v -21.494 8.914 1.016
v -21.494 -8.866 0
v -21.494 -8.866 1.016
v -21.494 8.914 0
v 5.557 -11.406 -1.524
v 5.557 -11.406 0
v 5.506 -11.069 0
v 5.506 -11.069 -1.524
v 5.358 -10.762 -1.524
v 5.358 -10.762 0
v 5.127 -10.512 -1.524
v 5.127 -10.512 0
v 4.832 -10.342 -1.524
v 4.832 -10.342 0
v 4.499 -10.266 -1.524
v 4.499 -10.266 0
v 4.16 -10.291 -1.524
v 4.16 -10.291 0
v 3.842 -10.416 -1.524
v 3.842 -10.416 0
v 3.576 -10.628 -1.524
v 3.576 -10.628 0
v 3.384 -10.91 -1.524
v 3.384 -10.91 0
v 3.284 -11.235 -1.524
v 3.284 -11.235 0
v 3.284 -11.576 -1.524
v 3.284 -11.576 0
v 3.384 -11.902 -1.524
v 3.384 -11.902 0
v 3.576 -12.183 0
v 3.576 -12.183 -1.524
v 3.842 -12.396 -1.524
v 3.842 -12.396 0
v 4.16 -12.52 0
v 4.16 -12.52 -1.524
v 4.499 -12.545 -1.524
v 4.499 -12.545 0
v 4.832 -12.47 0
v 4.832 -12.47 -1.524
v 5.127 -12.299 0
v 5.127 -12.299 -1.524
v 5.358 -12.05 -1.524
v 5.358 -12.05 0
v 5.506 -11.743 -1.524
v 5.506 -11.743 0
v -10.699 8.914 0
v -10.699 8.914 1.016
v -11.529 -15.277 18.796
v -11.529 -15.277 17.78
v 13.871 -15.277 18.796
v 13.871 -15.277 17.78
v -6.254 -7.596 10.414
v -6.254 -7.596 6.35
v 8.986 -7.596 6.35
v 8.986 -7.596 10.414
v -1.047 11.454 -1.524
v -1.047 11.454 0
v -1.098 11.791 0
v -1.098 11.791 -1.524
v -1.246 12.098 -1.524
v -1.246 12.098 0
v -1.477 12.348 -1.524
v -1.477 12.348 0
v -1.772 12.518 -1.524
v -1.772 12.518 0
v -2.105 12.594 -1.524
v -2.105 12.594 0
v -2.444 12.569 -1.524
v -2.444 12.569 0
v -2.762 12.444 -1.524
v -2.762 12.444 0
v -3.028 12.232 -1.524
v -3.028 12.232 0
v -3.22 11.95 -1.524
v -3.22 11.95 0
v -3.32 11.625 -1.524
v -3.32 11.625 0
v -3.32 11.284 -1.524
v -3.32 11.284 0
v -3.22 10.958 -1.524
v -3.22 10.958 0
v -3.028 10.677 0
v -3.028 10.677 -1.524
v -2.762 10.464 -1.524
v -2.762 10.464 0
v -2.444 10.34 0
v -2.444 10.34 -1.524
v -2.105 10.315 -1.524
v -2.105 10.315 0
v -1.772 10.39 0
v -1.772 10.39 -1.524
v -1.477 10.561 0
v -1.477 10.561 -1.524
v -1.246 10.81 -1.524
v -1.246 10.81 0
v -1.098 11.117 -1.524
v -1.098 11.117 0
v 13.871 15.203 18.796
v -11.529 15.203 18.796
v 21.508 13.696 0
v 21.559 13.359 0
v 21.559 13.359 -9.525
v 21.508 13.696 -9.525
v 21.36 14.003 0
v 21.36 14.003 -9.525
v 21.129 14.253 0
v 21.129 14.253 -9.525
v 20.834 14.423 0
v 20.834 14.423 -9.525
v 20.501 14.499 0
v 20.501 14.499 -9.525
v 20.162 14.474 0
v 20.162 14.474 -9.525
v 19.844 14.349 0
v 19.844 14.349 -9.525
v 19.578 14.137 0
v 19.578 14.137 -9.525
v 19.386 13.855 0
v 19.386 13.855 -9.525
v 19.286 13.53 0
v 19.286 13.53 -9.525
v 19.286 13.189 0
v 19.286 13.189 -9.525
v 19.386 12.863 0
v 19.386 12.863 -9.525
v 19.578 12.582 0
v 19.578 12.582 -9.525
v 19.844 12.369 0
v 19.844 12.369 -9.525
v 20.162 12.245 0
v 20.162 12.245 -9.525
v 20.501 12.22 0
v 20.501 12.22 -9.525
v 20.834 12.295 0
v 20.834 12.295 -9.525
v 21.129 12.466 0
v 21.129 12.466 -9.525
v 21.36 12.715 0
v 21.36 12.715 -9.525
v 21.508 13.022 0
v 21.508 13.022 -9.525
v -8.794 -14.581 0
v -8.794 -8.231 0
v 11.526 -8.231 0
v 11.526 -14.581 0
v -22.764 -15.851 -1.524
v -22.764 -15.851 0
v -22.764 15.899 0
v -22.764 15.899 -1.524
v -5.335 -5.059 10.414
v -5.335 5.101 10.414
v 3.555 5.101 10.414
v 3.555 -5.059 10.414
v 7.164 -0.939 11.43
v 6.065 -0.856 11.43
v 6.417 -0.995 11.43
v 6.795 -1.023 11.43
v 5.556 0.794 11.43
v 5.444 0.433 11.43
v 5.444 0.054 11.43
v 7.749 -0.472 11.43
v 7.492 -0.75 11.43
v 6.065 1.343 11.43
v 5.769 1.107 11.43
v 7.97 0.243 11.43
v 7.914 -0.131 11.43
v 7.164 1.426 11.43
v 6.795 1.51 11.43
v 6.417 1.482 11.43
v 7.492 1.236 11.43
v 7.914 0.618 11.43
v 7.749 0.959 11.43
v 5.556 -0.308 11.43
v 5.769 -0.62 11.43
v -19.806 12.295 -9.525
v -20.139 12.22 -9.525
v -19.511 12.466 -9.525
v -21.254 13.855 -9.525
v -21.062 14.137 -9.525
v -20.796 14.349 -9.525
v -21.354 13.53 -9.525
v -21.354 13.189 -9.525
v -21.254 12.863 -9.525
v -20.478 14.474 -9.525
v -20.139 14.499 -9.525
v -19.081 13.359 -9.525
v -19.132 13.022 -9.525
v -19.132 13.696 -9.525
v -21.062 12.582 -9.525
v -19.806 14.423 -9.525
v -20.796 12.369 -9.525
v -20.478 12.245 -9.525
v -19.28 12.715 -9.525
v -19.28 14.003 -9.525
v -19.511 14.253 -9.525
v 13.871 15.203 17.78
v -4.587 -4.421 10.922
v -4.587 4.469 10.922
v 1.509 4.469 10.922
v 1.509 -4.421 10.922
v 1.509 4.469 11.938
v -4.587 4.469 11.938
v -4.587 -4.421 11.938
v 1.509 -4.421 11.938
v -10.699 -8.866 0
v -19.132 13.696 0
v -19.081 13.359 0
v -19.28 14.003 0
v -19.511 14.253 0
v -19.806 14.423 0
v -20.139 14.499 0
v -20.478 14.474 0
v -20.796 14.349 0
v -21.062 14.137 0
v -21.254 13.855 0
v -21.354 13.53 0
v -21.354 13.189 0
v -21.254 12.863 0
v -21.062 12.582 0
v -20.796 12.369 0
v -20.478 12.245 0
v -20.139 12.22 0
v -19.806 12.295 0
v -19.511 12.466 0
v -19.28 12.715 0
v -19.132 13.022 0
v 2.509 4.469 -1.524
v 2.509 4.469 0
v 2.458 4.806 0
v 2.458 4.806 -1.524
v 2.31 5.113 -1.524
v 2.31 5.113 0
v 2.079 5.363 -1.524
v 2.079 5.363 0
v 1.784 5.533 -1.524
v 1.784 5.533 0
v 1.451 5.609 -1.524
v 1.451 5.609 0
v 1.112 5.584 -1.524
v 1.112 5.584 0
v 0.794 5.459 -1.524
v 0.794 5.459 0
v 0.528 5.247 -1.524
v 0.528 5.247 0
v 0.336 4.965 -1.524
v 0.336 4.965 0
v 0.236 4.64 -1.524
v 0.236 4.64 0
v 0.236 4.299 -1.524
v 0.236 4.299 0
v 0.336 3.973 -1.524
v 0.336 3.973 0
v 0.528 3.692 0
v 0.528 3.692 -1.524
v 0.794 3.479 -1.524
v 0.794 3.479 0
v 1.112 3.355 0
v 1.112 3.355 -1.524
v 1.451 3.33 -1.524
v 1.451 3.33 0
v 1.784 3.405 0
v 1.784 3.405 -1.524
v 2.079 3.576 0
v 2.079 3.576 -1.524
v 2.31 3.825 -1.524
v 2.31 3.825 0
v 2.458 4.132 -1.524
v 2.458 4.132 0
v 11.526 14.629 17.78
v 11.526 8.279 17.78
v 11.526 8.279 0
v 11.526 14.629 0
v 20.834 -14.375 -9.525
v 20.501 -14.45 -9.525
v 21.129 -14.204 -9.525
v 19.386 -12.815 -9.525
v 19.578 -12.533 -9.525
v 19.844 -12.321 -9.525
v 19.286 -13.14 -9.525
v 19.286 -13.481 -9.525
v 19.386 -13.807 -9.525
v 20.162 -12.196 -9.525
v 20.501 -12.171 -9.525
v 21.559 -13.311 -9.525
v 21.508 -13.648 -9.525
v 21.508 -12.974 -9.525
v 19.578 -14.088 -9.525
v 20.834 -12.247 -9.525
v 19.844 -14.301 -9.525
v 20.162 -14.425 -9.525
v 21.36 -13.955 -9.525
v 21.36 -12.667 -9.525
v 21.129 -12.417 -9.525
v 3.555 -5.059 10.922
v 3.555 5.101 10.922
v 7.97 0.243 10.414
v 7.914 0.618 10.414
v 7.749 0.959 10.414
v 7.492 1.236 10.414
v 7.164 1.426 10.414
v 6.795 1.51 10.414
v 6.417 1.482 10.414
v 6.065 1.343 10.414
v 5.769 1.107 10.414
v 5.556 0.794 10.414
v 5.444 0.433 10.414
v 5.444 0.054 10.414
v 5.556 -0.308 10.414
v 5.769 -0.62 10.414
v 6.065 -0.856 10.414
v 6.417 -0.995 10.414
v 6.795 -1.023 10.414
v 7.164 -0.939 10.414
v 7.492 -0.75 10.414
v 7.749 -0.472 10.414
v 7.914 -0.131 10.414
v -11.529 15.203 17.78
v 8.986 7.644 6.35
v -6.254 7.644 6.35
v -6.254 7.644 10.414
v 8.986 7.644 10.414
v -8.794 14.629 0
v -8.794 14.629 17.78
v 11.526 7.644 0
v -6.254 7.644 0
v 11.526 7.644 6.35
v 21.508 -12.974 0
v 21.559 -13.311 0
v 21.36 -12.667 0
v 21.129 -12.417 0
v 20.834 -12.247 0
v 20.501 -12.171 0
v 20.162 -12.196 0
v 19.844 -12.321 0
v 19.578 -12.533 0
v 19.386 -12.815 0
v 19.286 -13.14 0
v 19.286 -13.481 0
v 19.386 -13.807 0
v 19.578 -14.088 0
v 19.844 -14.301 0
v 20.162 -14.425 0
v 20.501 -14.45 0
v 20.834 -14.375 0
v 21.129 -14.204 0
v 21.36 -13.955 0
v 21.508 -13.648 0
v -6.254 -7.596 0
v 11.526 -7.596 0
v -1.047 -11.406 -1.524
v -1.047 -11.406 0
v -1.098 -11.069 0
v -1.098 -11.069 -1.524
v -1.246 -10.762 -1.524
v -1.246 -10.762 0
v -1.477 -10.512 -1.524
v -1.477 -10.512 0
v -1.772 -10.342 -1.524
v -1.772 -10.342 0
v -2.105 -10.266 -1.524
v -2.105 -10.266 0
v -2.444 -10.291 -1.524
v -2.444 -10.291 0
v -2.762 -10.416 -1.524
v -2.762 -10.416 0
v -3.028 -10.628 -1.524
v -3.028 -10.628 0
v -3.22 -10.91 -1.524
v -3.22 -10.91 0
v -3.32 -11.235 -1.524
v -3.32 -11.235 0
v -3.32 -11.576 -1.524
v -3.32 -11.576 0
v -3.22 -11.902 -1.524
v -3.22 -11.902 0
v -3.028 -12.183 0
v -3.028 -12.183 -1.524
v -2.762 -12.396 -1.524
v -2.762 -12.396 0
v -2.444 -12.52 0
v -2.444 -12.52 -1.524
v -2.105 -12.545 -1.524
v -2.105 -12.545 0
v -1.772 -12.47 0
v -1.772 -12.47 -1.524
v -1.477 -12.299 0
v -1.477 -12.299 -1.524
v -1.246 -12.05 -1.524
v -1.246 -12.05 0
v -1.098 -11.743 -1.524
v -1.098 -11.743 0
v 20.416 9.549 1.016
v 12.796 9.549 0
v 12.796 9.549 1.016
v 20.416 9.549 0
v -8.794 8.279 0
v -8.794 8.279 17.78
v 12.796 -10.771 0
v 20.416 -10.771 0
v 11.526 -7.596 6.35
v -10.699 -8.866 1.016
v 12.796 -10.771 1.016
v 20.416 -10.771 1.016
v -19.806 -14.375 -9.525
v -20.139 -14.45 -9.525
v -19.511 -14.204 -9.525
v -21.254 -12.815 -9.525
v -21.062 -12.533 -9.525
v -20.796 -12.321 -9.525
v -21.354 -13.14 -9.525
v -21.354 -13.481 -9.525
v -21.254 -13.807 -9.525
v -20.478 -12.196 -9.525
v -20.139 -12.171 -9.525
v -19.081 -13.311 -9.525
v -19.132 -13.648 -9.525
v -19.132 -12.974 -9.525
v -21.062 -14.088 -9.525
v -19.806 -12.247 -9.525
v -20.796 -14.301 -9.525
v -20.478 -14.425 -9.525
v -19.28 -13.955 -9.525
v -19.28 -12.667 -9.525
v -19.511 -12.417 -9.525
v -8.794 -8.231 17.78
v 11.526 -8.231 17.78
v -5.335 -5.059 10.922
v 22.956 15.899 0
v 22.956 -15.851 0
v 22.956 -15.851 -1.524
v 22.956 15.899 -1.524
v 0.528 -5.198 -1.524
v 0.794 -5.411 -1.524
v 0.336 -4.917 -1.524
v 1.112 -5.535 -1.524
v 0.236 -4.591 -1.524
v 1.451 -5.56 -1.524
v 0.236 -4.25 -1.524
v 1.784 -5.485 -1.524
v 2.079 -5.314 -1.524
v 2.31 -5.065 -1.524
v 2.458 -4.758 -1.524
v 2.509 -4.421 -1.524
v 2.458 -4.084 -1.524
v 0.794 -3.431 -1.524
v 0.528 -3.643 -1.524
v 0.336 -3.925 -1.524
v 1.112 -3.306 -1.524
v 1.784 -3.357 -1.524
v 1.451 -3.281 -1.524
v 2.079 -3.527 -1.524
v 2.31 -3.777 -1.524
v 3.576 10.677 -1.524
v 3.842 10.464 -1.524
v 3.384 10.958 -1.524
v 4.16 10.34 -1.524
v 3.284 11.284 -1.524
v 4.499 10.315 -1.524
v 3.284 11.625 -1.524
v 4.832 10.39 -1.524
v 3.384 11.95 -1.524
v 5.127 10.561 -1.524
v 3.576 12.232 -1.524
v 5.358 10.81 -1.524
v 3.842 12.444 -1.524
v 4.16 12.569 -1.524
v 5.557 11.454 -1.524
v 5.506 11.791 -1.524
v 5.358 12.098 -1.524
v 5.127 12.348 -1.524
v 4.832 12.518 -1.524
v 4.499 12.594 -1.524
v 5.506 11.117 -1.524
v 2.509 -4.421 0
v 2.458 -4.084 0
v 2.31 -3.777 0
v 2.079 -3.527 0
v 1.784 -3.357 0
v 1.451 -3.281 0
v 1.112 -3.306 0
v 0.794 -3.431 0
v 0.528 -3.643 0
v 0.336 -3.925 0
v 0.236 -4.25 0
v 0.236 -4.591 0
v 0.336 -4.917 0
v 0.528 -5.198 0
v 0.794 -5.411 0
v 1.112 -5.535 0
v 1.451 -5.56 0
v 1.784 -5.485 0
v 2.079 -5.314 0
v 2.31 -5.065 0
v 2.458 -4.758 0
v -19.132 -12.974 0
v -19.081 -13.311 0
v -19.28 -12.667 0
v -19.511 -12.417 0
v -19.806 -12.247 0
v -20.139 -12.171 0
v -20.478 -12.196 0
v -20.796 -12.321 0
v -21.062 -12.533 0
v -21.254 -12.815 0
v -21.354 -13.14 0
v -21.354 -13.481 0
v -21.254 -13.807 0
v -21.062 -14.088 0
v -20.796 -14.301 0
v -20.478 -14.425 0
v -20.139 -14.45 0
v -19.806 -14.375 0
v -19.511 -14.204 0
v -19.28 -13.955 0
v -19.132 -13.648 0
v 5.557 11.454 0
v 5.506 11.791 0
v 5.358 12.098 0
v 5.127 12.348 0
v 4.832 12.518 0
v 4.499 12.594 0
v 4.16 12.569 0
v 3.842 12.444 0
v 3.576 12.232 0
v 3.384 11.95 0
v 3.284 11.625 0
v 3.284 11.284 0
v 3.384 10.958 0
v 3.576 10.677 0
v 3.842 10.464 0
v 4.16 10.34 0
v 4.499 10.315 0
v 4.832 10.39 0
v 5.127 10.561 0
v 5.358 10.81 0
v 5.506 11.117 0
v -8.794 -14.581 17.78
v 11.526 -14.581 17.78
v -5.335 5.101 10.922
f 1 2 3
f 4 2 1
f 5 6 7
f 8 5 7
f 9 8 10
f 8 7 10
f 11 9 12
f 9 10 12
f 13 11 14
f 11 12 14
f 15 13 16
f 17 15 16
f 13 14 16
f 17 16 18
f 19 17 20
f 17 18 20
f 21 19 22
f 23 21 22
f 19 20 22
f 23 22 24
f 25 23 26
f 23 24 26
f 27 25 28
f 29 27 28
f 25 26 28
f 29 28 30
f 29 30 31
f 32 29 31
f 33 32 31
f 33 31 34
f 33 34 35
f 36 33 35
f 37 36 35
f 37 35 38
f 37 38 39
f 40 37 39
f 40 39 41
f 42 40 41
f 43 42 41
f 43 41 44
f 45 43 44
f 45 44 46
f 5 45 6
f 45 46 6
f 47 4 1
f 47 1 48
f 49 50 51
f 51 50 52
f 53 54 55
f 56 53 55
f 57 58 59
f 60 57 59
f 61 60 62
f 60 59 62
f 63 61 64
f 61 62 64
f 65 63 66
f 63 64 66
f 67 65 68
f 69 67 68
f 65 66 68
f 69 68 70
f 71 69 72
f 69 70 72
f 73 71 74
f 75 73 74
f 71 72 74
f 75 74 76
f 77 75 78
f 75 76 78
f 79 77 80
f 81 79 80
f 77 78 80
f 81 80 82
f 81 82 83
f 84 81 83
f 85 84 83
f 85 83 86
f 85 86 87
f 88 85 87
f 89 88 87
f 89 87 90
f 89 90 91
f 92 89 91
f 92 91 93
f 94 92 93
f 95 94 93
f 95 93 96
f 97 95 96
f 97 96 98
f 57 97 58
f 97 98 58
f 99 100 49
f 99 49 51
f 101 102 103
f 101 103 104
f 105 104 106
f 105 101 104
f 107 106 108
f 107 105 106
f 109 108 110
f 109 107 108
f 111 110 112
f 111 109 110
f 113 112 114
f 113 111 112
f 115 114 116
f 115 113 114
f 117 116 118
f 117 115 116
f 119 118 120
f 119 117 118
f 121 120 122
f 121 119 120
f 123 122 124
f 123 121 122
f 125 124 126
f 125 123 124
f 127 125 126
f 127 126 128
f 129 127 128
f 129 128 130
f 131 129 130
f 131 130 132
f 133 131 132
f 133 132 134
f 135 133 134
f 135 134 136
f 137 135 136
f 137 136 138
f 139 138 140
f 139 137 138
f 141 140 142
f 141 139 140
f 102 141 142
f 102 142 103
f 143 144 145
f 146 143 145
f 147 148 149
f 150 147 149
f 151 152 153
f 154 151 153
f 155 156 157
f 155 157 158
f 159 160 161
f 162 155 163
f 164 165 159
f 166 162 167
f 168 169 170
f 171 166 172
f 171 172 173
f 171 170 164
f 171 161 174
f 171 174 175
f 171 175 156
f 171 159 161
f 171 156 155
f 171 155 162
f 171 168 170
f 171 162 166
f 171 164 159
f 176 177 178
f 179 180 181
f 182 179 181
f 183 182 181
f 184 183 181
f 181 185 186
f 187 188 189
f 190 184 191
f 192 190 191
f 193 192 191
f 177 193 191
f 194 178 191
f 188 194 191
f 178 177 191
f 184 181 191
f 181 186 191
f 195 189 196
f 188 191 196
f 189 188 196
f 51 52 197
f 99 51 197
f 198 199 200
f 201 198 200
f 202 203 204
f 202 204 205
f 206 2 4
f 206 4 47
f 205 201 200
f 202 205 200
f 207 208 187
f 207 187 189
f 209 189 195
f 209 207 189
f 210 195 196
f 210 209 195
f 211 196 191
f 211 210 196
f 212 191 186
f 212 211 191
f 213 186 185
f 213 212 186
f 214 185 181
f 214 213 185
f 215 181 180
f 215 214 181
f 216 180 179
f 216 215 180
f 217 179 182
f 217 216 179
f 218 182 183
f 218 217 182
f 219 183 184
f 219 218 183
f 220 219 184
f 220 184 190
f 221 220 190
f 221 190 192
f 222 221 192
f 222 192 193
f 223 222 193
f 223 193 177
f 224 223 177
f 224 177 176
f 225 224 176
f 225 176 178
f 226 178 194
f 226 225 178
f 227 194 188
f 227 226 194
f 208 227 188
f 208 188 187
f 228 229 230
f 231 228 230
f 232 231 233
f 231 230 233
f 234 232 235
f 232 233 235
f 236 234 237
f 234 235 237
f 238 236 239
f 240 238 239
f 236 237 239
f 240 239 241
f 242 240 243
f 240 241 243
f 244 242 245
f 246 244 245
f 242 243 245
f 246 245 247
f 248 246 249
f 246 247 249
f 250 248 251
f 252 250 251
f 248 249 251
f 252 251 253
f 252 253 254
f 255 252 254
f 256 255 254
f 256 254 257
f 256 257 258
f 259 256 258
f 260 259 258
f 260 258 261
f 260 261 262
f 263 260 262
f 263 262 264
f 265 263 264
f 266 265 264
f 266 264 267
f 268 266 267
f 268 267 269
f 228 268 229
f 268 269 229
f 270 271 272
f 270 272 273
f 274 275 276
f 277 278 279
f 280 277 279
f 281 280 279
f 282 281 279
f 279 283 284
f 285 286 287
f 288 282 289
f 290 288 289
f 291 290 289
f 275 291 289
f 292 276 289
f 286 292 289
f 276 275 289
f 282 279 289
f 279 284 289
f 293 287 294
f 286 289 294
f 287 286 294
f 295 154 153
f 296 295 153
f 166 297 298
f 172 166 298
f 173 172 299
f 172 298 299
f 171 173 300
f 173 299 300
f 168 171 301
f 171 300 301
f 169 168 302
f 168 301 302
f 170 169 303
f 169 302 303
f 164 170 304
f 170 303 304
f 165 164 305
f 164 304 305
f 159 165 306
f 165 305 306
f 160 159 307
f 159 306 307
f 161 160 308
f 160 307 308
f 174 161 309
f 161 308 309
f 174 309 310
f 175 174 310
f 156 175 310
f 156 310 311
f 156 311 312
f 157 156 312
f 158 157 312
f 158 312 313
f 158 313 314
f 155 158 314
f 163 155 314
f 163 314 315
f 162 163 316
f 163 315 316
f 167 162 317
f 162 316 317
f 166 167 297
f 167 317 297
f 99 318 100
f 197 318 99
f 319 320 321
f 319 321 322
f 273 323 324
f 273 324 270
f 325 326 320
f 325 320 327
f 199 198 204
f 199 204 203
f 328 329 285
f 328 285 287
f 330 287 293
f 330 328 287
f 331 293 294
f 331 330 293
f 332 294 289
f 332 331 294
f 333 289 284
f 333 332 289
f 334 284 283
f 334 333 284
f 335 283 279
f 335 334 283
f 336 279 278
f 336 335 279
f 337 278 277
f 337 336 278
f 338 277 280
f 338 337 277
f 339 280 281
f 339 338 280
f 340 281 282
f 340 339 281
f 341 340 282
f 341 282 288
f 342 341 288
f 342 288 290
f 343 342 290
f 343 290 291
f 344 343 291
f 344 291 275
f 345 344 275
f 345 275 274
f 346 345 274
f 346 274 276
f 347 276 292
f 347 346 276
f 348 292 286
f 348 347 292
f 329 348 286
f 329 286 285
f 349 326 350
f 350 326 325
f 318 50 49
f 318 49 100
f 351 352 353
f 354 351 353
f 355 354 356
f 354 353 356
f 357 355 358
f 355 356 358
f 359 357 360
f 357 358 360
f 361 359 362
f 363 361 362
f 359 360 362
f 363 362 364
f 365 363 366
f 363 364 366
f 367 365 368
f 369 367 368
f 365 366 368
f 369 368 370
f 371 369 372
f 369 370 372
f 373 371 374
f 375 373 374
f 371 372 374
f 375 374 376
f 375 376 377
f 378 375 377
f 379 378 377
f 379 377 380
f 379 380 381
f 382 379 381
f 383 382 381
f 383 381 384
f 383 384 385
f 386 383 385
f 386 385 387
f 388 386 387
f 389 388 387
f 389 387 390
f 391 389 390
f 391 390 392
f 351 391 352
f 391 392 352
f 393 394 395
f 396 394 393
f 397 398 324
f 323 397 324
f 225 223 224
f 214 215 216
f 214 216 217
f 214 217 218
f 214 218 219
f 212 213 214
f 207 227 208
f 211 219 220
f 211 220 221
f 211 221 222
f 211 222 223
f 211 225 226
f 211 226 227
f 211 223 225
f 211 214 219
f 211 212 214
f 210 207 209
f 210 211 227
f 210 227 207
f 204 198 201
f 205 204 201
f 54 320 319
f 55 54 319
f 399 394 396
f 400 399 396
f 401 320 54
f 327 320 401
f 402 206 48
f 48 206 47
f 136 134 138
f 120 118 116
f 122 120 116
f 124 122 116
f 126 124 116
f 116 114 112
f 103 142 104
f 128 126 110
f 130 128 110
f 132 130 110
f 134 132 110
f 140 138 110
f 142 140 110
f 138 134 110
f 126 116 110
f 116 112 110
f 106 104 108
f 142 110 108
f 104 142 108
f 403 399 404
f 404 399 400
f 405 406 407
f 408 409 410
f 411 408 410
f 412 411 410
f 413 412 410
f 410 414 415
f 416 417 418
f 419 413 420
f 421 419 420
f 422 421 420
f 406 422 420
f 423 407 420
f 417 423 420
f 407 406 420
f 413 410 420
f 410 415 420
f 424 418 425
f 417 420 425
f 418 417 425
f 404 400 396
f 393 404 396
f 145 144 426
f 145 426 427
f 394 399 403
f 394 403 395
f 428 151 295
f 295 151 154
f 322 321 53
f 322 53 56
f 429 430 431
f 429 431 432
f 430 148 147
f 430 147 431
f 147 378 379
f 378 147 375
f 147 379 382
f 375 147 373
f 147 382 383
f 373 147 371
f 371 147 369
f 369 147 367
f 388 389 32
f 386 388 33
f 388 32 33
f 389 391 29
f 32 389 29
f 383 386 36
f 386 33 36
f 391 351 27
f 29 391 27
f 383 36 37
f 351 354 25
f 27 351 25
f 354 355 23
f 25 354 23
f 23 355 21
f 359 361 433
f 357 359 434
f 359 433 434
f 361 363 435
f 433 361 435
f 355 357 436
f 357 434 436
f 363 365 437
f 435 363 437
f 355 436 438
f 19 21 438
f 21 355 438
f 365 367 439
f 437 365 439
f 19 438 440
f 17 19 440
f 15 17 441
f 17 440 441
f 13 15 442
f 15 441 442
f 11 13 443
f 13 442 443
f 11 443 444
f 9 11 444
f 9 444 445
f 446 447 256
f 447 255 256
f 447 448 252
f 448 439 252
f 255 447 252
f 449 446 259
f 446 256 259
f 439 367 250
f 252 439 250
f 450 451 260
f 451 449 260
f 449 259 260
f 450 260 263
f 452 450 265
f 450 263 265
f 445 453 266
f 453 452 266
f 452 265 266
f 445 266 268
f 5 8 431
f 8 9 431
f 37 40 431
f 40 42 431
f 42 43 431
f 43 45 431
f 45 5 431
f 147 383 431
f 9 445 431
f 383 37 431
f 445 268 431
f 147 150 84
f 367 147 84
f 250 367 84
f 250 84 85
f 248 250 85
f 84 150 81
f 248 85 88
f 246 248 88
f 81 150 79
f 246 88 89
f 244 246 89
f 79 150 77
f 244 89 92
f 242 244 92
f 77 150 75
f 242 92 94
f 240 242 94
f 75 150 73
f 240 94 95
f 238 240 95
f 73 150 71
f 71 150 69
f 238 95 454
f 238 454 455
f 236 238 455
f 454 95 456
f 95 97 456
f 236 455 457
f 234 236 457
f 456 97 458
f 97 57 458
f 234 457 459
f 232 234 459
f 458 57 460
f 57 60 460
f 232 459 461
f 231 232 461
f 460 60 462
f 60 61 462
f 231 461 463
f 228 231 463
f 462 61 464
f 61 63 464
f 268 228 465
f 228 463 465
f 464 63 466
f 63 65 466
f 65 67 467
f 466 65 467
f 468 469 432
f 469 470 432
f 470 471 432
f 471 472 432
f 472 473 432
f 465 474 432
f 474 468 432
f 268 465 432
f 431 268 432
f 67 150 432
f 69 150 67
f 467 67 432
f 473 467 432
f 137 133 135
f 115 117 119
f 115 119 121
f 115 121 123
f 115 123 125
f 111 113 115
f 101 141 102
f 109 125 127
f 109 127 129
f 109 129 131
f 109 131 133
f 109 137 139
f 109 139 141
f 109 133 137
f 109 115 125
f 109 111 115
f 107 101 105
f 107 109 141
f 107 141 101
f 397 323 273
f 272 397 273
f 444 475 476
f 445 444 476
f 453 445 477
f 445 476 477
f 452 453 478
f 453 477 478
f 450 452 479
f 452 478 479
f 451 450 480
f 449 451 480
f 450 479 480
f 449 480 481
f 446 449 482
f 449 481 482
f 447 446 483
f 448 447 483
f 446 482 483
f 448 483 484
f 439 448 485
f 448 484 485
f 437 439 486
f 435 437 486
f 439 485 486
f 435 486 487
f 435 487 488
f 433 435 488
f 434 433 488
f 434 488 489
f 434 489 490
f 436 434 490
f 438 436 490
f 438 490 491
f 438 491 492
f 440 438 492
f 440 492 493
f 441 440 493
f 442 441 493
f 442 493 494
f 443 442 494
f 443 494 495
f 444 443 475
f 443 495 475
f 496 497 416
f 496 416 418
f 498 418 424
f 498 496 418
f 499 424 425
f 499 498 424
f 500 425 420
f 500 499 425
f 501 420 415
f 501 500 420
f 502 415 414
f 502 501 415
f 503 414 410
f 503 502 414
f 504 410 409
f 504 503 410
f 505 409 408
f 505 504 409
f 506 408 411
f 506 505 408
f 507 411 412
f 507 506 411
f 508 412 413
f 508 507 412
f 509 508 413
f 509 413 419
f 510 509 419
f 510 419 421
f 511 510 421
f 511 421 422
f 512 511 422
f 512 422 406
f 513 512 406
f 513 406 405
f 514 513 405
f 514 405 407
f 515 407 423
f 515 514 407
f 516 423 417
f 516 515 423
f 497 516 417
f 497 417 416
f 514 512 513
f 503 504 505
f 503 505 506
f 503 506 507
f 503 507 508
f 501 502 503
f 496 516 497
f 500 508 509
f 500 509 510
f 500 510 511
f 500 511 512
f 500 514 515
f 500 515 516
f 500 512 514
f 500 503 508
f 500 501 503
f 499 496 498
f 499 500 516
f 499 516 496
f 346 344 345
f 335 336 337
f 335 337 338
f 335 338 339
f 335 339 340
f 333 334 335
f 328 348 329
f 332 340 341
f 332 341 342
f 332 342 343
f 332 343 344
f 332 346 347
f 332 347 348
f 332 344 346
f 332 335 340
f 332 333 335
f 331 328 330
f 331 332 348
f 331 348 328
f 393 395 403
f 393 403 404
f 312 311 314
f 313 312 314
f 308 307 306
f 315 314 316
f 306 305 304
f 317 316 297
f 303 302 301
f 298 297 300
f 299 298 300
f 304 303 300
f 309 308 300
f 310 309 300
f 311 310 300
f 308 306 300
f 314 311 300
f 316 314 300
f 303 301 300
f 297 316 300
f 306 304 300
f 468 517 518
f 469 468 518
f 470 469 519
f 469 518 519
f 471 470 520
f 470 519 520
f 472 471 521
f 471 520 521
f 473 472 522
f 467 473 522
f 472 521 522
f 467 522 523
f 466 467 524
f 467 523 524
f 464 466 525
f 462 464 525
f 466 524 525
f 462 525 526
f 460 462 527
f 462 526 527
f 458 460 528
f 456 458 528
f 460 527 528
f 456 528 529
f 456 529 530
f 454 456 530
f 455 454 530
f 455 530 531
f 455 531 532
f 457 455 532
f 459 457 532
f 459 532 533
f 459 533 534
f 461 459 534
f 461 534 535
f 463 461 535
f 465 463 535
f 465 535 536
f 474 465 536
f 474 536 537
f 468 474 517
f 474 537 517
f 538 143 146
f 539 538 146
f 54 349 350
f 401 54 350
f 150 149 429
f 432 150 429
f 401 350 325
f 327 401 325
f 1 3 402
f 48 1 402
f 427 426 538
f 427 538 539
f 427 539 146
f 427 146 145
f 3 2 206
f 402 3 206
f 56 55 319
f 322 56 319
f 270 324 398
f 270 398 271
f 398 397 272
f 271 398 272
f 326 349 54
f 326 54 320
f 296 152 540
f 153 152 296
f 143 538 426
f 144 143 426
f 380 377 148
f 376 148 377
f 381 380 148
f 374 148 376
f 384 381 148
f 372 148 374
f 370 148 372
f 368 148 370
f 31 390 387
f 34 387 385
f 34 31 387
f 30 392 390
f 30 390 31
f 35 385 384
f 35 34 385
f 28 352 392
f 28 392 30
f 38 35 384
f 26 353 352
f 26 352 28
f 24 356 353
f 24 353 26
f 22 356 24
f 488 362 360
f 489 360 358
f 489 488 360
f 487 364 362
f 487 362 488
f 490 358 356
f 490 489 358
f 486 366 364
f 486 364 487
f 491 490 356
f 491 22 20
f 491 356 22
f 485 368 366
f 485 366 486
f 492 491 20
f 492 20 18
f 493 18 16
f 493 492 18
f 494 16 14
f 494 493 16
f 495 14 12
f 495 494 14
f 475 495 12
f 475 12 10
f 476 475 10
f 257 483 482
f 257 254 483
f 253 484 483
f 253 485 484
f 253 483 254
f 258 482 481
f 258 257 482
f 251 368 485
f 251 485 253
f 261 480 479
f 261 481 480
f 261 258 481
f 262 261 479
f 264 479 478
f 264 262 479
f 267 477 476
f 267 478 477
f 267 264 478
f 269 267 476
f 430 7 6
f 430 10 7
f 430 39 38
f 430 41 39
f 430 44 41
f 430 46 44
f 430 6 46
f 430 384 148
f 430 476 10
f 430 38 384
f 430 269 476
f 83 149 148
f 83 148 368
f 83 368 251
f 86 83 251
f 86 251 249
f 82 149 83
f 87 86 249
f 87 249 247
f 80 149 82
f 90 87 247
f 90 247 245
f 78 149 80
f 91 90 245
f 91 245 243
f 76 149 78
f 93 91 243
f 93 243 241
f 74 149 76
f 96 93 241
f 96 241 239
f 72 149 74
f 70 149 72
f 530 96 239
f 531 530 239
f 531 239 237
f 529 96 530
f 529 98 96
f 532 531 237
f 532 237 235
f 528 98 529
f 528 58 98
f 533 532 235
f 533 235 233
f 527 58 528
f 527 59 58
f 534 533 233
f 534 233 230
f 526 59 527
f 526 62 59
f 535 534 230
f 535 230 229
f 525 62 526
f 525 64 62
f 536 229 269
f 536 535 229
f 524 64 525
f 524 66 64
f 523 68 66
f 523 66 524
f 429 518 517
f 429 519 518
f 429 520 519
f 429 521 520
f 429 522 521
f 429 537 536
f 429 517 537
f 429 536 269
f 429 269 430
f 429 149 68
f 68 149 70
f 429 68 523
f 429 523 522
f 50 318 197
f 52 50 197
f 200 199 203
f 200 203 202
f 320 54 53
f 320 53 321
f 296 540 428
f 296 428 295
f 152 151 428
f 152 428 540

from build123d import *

# Parameters (mm, degrees)
F0_W      = 45.72
F0_H      = 31.75
F0_R      = 1.143
F1_DEPTH  = 1.524
F2_R      = 1.143
F3_DEPTH  = 9.525
F4_W      = 17.78
F4_H      = 15.24
F5_DEPTH  = 6.35
F6_W      = 15.24
F6_H      = 15.24
F7_DEPTH  = 4.064
F8_W      = 20.32
F8_H      = 6.35
F9_DEPTH  = 17.78
F10_W     = 8.89
F10_H     = 10.16
F11_DEPTH = 0.508
F12_W     = 6.096
F12_H     = 8.89
F13_DEPTH = 1.016
F14_R     = 1.27
F15_DEPTH = 1.016
F16_W     = 25.4
F16_H     = 30.48
F17_DEPTH = 1.016
F18_W     = 10.795
F18_H     = 17.78
F18_W_2   = 7.62
F18_H_2   = 20.32
F19_DEPTH = 1.016


with BuildPart() as f1:
    # F0 (on Top) → F1 (new body)
    with BuildSketch(Plane.XY):
        with Locations((0.095934, 0.024364)):
            Rectangle(F0_W, F0_H)
        with Locations((-2.190066, -11.405636)):
            Circle(F0_R, mode=Mode.SUBTRACT)
        with Locations((4.413934, -11.405636)):
            Circle(F0_R, mode=Mode.SUBTRACT)
        with Locations((1.365934, -4.420636)):
            Circle(F0_R, mode=Mode.SUBTRACT)
        with Locations((-2.190066, 11.454364)):
            Circle(F0_R, mode=Mode.SUBTRACT)
        with Locations((1.365934, 4.469364)):
            Circle(F0_R, mode=Mode.SUBTRACT)
        with Locations((4.413934, 11.454364)):
            Circle(F0_R, mode=Mode.SUBTRACT)
    extrude(amount=-F1_DEPTH)


with BuildPart() as f3:
    # F2 (on Top) → F3 (new body)
    with BuildSketch(Plane.XY):
        with Locations((-20.224066, 13.359364)):
            Circle(F2_R)
        with Locations((-20.224066, -13.310636)):
            Circle(F2_R)
        with Locations((20.415934, -13.310636)):
            Circle(F2_R)
        with Locations((20.415934, 13.359364)):
            Circle(F2_R)
    extrude(amount=-F3_DEPTH)


with BuildPart() as f5:
    # F4 (on Top) → F5 (new body)
    with BuildSketch(Plane.XY):
        with Locations((2.635934, 0.024364)):
            Rectangle(F4_W, F4_H)
    extrude(amount=F5_DEPTH)


with BuildPart() as f7:
    # F6 (on face) → F7 (new body)
    with BuildSketch(Plane.XY.offset(6.35)):
        with Locations((1.365934, 0.024364)):
            Rectangle(F6_W, F6_H)
    extrude(amount=F7_DEPTH)


with BuildPart() as f9:
    # F8 (on face) → F9 (new body)
    with BuildSketch(Plane.XY):
        with Locations((1.365934, -11.405636)):
            Rectangle(F8_W, F8_H)
        with Locations((1.365934, 11.454364)):
            Rectangle(F8_W, F8_H)
    extrude(amount=F9_DEPTH)


with BuildPart() as f11:
    # F10 (on face) → F11 (new body)
    with BuildSketch(Plane.XY.offset(10.414)):
        with Locations((-0.889577, 0.0209)):
            Rectangle(F10_W, F10_H)
    extrude(amount=F11_DEPTH)


with BuildPart() as f13:
    # F12 (on face) → F13 (new body)
    with BuildSketch(Plane.XY.offset(10.922)):
        with Locations((-1.538513, 0.024363)):
            Rectangle(F12_W, F12_H)
    extrude(amount=F13_DEPTH)


with BuildPart() as f15:
    # F14 (on face) → F15 (new body)
    with BuildSketch(Plane.XY.offset(10.414)):
        with Locations((6.699934, 0.243398)):
            Circle(F14_R)
    extrude(amount=F15_DEPTH)


with BuildPart() as f17:
    # F16 (on face) → F17 (new body)
    with BuildSketch(Plane.XY.offset(17.78)):
        with Locations((1.170507, -0.036698)):
            Rectangle(F16_W, F16_H)
    extrude(amount=F17_DEPTH)


with BuildPart() as f19:
    # F18 (on face) → F19 (new body)
    with BuildSketch(Plane.XY):
        with Locations((-16.096566, 0.024364)):
            Rectangle(F18_W, F18_H)
        with Locations((16.605934, -0.610636)):
            Rectangle(F18_W_2, F18_H_2)
    extrude(amount=F19_DEPTH)


solid = Compound([f1.part, f3.part, f5.part, f7.part, f9.part, f11.part, f13.part, f15.part, f17.part, f19.part])
